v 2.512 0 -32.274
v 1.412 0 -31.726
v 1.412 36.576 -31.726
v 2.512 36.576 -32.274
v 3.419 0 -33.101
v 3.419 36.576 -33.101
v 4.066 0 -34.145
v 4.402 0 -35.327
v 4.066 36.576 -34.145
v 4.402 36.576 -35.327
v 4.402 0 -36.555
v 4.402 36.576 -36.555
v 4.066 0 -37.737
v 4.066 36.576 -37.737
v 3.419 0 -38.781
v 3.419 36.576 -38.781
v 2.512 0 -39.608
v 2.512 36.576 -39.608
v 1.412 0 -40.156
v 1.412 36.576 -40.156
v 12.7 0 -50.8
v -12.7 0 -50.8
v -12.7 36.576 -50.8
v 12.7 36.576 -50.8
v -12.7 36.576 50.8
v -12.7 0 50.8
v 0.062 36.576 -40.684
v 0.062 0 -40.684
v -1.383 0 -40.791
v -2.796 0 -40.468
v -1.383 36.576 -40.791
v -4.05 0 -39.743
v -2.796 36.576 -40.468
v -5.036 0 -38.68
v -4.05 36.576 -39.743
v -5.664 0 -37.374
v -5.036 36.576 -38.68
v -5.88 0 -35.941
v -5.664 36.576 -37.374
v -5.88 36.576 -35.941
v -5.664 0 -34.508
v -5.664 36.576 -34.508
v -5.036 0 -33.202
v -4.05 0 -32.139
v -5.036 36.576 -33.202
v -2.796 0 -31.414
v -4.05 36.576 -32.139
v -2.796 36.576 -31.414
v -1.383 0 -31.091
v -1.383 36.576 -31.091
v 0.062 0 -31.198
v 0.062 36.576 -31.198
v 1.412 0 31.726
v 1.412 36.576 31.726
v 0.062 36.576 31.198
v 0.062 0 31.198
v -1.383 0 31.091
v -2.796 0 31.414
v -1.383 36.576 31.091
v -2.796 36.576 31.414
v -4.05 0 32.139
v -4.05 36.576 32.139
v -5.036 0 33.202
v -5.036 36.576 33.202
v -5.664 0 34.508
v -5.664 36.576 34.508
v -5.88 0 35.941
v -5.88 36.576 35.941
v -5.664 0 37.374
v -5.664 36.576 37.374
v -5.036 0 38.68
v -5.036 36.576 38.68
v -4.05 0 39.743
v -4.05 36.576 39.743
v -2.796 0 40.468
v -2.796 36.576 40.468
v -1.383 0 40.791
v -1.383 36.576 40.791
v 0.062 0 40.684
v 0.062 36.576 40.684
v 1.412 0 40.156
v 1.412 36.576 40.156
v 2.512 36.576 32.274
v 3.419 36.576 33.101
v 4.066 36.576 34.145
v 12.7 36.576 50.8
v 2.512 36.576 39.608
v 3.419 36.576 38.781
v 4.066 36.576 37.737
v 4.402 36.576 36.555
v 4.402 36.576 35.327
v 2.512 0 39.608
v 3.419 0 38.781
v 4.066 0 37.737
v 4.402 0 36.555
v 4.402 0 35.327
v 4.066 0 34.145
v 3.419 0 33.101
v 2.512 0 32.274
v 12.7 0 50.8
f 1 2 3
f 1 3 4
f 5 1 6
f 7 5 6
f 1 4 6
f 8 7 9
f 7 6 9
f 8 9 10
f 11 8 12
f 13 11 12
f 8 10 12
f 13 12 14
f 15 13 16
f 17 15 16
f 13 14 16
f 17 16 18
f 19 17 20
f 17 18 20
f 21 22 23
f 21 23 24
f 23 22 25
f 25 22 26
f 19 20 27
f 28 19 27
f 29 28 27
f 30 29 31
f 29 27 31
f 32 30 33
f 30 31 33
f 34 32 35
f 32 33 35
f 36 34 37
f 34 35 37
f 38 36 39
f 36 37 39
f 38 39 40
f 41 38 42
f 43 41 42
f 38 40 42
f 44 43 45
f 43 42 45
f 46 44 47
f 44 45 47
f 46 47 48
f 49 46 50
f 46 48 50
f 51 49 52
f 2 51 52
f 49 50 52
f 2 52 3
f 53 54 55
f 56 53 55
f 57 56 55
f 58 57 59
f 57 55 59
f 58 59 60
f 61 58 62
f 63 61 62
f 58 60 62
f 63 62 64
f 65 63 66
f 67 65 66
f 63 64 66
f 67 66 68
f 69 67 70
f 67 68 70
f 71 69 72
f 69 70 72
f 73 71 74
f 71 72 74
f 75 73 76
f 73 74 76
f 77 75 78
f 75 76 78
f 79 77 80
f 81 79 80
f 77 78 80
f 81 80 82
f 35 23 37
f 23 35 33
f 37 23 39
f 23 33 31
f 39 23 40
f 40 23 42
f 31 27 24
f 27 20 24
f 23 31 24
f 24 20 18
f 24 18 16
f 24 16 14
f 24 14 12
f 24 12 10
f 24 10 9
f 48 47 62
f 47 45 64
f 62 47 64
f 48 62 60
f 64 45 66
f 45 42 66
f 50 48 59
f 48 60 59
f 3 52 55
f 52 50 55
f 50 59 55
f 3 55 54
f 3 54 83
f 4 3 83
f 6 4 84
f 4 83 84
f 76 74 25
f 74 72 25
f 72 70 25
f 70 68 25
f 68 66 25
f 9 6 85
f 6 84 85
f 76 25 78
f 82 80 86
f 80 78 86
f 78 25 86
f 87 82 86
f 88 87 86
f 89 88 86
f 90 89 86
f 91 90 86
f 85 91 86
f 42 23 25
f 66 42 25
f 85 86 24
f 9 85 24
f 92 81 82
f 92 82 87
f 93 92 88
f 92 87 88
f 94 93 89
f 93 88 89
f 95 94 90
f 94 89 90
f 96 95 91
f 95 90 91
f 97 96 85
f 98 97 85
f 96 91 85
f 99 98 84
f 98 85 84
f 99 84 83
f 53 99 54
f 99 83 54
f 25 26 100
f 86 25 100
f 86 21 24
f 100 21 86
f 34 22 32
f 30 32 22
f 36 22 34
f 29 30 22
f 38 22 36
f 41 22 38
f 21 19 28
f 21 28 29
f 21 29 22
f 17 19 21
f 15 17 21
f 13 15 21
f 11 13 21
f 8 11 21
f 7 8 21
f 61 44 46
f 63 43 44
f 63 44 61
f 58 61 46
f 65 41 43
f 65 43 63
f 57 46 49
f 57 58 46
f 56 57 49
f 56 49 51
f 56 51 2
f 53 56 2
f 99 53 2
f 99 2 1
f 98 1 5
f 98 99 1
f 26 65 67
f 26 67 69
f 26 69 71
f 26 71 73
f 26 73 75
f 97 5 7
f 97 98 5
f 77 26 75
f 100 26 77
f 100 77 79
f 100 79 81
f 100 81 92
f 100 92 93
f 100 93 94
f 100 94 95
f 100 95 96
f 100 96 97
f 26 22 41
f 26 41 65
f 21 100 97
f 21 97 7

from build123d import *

# Parameters (mm, degrees)
F0_W     = 25.4
F0_H     = 101.6
F1_DEPTH = 36.576
F2_D     = 8.89
F3_D     = 9.7282


with BuildPart() as f1:
    # F0 (on Front) → F1 (new body)
    with BuildSketch(Plane.XZ):
        Rectangle(F0_W, F0_H)
    extrude(amount=-F1_DEPTH)

    # F2 (through all)
    with Locations(Plane.XZ):
        with Locations((0, 35.941), (0, -35.941)):
            Hole(F2_D / 2)

    # F3 (through all)
    with Locations(Plane.XZ):
        with Locations((-1.016, 35.941), (-1.016, -35.941)):
            Hole(F3_D / 2)


solid = f1.part
